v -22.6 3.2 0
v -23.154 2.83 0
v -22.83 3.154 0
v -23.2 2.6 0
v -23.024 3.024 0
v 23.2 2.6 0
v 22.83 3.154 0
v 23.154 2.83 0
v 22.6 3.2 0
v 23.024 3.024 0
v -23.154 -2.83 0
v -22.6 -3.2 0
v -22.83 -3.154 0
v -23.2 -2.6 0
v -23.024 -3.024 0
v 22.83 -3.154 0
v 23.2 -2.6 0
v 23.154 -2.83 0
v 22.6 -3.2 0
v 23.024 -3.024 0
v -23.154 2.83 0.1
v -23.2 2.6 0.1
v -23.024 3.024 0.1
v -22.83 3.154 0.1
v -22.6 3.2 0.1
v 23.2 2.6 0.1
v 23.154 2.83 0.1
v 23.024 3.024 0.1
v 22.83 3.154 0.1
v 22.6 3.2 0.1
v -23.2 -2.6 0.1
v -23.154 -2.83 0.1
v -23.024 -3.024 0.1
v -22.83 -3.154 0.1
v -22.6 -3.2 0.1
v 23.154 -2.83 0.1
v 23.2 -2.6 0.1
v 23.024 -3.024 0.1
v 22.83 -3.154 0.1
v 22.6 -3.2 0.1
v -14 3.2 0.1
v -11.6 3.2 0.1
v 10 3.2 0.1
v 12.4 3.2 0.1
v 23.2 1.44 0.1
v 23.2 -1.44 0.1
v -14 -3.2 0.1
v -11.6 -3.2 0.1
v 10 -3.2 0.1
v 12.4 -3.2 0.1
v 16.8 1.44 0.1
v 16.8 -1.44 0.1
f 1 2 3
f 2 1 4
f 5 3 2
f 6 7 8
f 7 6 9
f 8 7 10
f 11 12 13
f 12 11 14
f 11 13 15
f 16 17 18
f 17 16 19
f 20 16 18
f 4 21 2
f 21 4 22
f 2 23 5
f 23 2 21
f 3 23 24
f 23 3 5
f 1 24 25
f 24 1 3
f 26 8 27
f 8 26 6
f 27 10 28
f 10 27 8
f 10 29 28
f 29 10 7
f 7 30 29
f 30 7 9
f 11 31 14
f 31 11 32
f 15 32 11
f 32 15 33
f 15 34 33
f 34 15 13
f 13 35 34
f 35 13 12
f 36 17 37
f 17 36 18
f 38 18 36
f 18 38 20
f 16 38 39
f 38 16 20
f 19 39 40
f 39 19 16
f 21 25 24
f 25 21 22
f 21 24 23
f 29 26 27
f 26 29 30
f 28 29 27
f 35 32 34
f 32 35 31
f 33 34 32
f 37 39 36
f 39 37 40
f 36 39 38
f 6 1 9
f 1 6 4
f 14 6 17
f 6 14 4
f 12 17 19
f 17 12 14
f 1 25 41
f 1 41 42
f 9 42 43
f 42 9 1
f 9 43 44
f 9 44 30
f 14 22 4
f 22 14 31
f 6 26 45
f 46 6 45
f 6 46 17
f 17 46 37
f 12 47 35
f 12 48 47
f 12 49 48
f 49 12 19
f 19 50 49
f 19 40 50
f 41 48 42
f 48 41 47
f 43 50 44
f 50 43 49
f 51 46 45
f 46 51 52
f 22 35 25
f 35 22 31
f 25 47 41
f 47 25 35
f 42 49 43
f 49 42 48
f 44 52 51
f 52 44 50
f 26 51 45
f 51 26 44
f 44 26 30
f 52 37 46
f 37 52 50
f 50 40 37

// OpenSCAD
// file: ../p/1-4cyli.scad
use <../lib.scad>
function ldraw_lib__1_4cyli() = [
// 0 Cylinder 0.25
// 0 Name: 1-4cyli.dat
// 0 Author: James Jessiman
// 0 !LDRAW_ORG Primitive UPDATE 2012-01
// 0 !LICENSE Licensed under CC BY 4.0 : see CAreadme.txt
// 
// 0 BFC CERTIFY CCW
  [0,"BFC","CERTIFY"],
  [0,"BFC","CCW"],
// 
// 0 !HISTORY 2002-03-23 [sbliss] Added BFC statement.
// 0 !HISTORY 2002-04-25 [PTadmin] Official Update 2002-02
// 0 !HISTORY 2007-06-22 [PTadmin] Header formatted for Contributor Agreement
// 0 !HISTORY 2008-07-01 [PTadmin] Official Update 2008-01
// 0 !HISTORY 2012-02-16 [Philo] Changed to CCW
// 0 !HISTORY 2012-03-30 [PTadmin] Official Update 2012-01
// 
// 
// 4 16 1 1 0 0.9239 1 0.3827 0.9239 0 0.3827 1 0 0
  [4,16,1,1,0,0.9239,1,0.3827,0.9239,0,0.3827,1,0,0],
// 5 24 1 0 0 1 1 0 0.9239 0 0.3827 1 0 -1
  [5,24,1,0,0,1,1,0,0.9239,0,0.3827,1,0,-1],
// 4 16 0.9239 1 0.3827 0.7071 1 0.7071 0.7071 0 0.7071 0.9239 0 0.3827
  [4,16,0.9239,1,0.3827,0.7071,1,0.7071,0.7071,0,0.7071,0.9239,0,0.3827],
// 5 24 0.9239 0 0.3827 0.9239 1 0.3827 0.7071 0 0.7071 1 0 0
  [5,24,0.9239,0,0.3827,0.9239,1,0.3827,0.7071,0,0.7071,1,0,0],
// 4 16 0.7071 1 0.7071 0.3827 1 0.9239 0.3827 0 0.9239 0.7071 0 0.7071
  [4,16,0.7071,1,0.7071,0.3827,1,0.9239,0.3827,0,0.9239,0.7071,0,0.7071],
// 5 24 0.7071 0 0.7071 0.7071 1 0.7071 0.3827 0 0.9239 0.9239 0 0.3827
  [5,24,0.7071,0,0.7071,0.7071,1,0.7071,0.3827,0,0.9239,0.9239,0,0.3827],
// 4 16 0.3827 1 0.9239 0 1 1 0 0 1 0.3827 0 0.9239
  [4,16,0.3827,1,0.9239,0,1,1,0,0,1,0.3827,0,0.9239],
// 5 24 0.3827 0 0.9239 0.3827 1 0.9239 0 0 1 0.7071 0 0.7071
  [5,24,0.3827,0,0.9239,0.3827,1,0.9239,0,0,1,0.7071,0,0.7071],
// 5 24 0 0 1 0 1 1 0.3827 0 0.9239 -1 0 1
  [5,24,0,0,1,0,1,1,0.3827,0,0.9239,-1,0,1],
];
module ldraw_lib__1_4cyli(step=0, col=false, unit=2/5, alt=false, line=0.2, solid=!$preview)
    makepoly(ldraw_lib__1_4cyli(), step=step, col=col, unit=unit, alt=alt, line=line, solid=solid);
ldraw_lib__1_4cyli(line=0.2);
// file: ../p/1-4chrd.scad
use <../lib.scad>
function ldraw_lib__1_4chrd() = [
// 0 Chord 0.25
// 0 Name: 1-4chrd.dat
// 0 Author: Max Martin Richter [MMR1988]
// 0 !LDRAW_ORG Primitive UPDATE 2023-05
// 0 !LICENSE Licensed under CC BY 4.0 : see CAreadme.txt
// 
// 0 BFC CERTIFY CCW
  [0,"BFC","CERTIFY"],
  [0,"BFC","CCW"],
// 
// 0 !HISTORY 2004-04-22 [PTadmin] Official Update 2004-02
// 0 !HISTORY 2007-10-09 [PTadmin] Header formatted for Contributor Agreement
// 0 !HISTORY 2008-07-01 [PTadmin] Official Update 2008-01
// 0 !HISTORY 2012-08-02 [MMR1988] Re-creation with PrimGen2 and Rectifier
// 0 !HISTORY 2012-08-09 [PTadmin] Official Update 2012-02
// 0 !HISTORY 2023-10-27 [OrionP] Change author to MMR1988 from hafhead
// 0 !HISTORY 2023-10-31 [OrionP] Official Update 2023-05
// 
// 4 16 0.9239 0 0.3827 0.3827 0 0.9239 0 0 1 1 0 0
  [4,16,0.9239,0,0.3827,0.3827,0,0.9239,0,0,1,1,0,0],
// 3 16 0.7071 0 0.7071 0.3827 0 0.9239 0.9239 0 0.3827
  [3,16,0.7071,0,0.7071,0.3827,0,0.9239,0.9239,0,0.3827],
];
module ldraw_lib__1_4chrd(step=0, col=false, unit=2/5, alt=false, line=0.2, solid=!$preview)
    makepoly(ldraw_lib__1_4chrd(), step=step, col=col, unit=unit, alt=alt, line=line, solid=solid);
ldraw_lib__1_4chrd(line=0.2);
// main file
use <../lib.scad>
use <../p/1-4chrd.scad>
use <../p/1-4cyli.scad>
function ldraw_lib__6148328at() = [
// 0 Sticker  0.8 x  5.8 with Dark Grey Lines on White Background
// 0 Name: 6148328at.dat
// 0 Author: Massimo Maso [Sirio]
// 0 !LDRAW_ORG Part UPDATE 2024-08
// 0 !LICENSE Licensed under CC BY 4.0 : see CAreadme.txt
// 
// 0 BFC CERTIFY CCW
  [0,"BFC","CERTIFY"],
  [0,"BFC","CCW"],
// 
// 0 !KEYWORDS 919, Bricklink 75876stk01, Brickowl 852010, Hybrid, Pit Lane
// 0 !KEYWORDS Porsche, Rebrickable 26357, set 75876, Speed Champions
// 
// 0 !HISTORY 2024-09-30 [OrionP] Official Update 2024-08
// 
// 
// 0 // Primitives
// 1 16 -56.5 0 6.5 -1.5 0 0 0 -1 0 0 0 1.5 1-4chrd.dat
  [1,16,-56.5,0,6.5,-1.5,0,0,0,-1,0,0,0,1.5, ldraw_lib__1_4chrd()],
// 1 16 56.5 0 6.5 1.5 0 0 0 -1 0 0 0 1.5 1-4chrd.dat
  [1,16,56.5,0,6.5,1.5,0,0,0,-1,0,0,0,1.5, ldraw_lib__1_4chrd()],
// 1 16 -56.5 0 -6.5 -1.5 0 0 0 -1 0 0 0 -1.5 1-4chrd.dat
  [1,16,-56.5,0,-6.5,-1.5,0,0,0,-1,0,0,0,-1.5, ldraw_lib__1_4chrd()],
// 1 16 56.5 0 -6.5 1.5 0 0 0 -1 0 0 0 -1.5 1-4chrd.dat
  [1,16,56.5,0,-6.5,1.5,0,0,0,-1,0,0,0,-1.5, ldraw_lib__1_4chrd()],
// 1 16 -56.5 0 6.5 -1.5 0 0 0 -.25 0 0 0 1.5 1-4cyli.dat
  [1,16,-56.5,0,6.5,-1.5,0,0,0,-.25,0,0,0,1.5, ldraw_lib__1_4cyli()],
// 1 16 56.5 0 6.5 1.5 0 0 0 -.25 0 0 0 1.5 1-4cyli.dat
  [1,16,56.5,0,6.5,1.5,0,0,0,-.25,0,0,0,1.5, ldraw_lib__1_4cyli()],
// 1 16 -56.5 0 -6.5 -1.5 0 0 0 -.25 0 0 0 -1.5 1-4cyli.dat
  [1,16,-56.5,0,-6.5,-1.5,0,0,0,-.25,0,0,0,-1.5, ldraw_lib__1_4cyli()],
// 1 16 56.5 0 -6.5 1.5 0 0 0 -.25 0 0 0 -1.5 1-4cyli.dat
  [1,16,56.5,0,-6.5,1.5,0,0,0,-.25,0,0,0,-1.5, ldraw_lib__1_4cyli()],
// 1 15 -56.5 -.25 6.5 -1.5 0 0 0 1 0 0 0 1.5 1-4chrd.dat
  [1,15,-56.5,-.25,6.5,-1.5,0,0,0,1,0,0,0,1.5, ldraw_lib__1_4chrd()],
// 1 15 56.5 -.25 6.5 1.5 0 0 0 1 0 0 0 1.5 1-4chrd.dat
  [1,15,56.5,-.25,6.5,1.5,0,0,0,1,0,0,0,1.5, ldraw_lib__1_4chrd()],
// 1 15 -56.5 -.25 -6.5 -1.5 0 0 0 1 0 0 0 -1.5 1-4chrd.dat
  [1,15,-56.5,-.25,-6.5,-1.5,0,0,0,1,0,0,0,-1.5, ldraw_lib__1_4chrd()],
// 1 15 56.5 -.25 -6.5 1.5 0 0 0 1 0 0 0 -1.5 1-4chrd.dat
  [1,15,56.5,-.25,-6.5,1.5,0,0,0,1,0,0,0,-1.5, ldraw_lib__1_4chrd()],
// 0 // Bottom faces
// 4 16 56.5 0 8 58 0 6.5 -58 0 6.5 -56.5 0 8
  [4,16,56.5,0,8,58,0,6.5,-58,0,6.5,-56.5,0,8],
// 4 16 58 0 6.5 58 0 -6.5 -58 0 -6.5 -58 0 6.5
  [4,16,58,0,6.5,58,0,-6.5,-58,0,-6.5,-58,0,6.5],
// 4 16 56.5 0 -8 -56.5 0 -8 -58 0 -6.5 58 0 -6.5
  [4,16,56.5,0,-8,-56.5,0,-8,-58,0,-6.5,58,0,-6.5],
// 0 // Lateral faces
// 3 16 -56.5 0 8 -56.5 -.25 8 -35 -.25 8
  [3,16,-56.5,0,8,-56.5,-.25,8,-35,-.25,8],
// 3 16 -56.5 0 8 -35 -.25 8 -29 -.25 8
  [3,16,-56.5,0,8,-35,-.25,8,-29,-.25,8],
// 4 16 -56.5 0 8 -29 -.25 8 25 -.25 8 56.5 0 8
  [4,16,-56.5,0,8,-29,-.25,8,25,-.25,8,56.5,0,8],
// 3 16 56.5 0 8 25 -.25 8 31 -.25 8
  [3,16,56.5,0,8,25,-.25,8,31,-.25,8],
// 3 16 56.5 0 8 31 -.25 8 56.5 -.25 8
  [3,16,56.5,0,8,31,-.25,8,56.5,-.25,8],
// 4 16 -58 0 6.5 -58 0 -6.5 -58 -.25 -6.5 -58 -.25 6.5
  [4,16,-58,0,6.5,-58,0,-6.5,-58,-.25,-6.5,-58,-.25,6.5],
// 3 16 58 0 6.5 58 -.25 6.5 58 -.25 3.6
  [3,16,58,0,6.5,58,-.25,6.5,58,-.25,3.6],
// 4 16 58 0 6.5 58 -.25 3.6 58 -.25 -3.6 58 0 -6.5
  [4,16,58,0,6.5,58,-.25,3.6,58,-.25,-3.6,58,0,-6.5],
// 3 16 58 0 -6.5 58 -.25 -3.6 58 -.25 -6.5
  [3,16,58,0,-6.5,58,-.25,-3.6,58,-.25,-6.5],
// 3 16 -56.5 0 -8 -35 -.25 -8 -56.5 -.25 -8
  [3,16,-56.5,0,-8,-35,-.25,-8,-56.5,-.25,-8],
// 3 16 -56.5 0 -8 -29 -.25 -8 -35 -.25 -8
  [3,16,-56.5,0,-8,-29,-.25,-8,-35,-.25,-8],
// 4 16 -56.5 0 -8 56.5 0 -8 25 -.25 -8 -29 -.25 -8
  [4,16,-56.5,0,-8,56.5,0,-8,25,-.25,-8,-29,-.25,-8],
// 3 16 56.5 0 -8 31 -.25 -8 25 -.25 -8
  [3,16,56.5,0,-8,31,-.25,-8,25,-.25,-8],
// 3 16 56.5 0 -8 56.5 -.25 -8 31 -.25 -8
  [3,16,56.5,0,-8,56.5,-.25,-8,31,-.25,-8],
// 0 // Top faces
// 0 // Dark grey faces
// 4 72 -29 -.25 8 -35 -.25 8 -35 -.25 -8 -29 -.25 -8
  [4,72,-29,-.25,8,-35,-.25,8,-35,-.25,-8,-29,-.25,-8],
// 4 72 31 -.25 8 25 -.25 8 25 -.25 -8 31 -.25 -8
  [4,72,31,-.25,8,25,-.25,8,25,-.25,-8,31,-.25,-8],
// 4 72 58 -.25 3.6 42 -.25 3.6 42 -.25 -3.6 58 -.25 -3.6
  [4,72,58,-.25,3.6,42,-.25,3.6,42,-.25,-3.6,58,-.25,-3.6],
// 0 // White faces
// 4 15 -56.5 -.25 8 -58 -.25 6.5 -58 -.25 -6.5 -56.5 -.25 -8
  [4,15,-56.5,-.25,8,-58,-.25,6.5,-58,-.25,-6.5,-56.5,-.25,-8],
// 4 15 -56.5 -.25 8 -56.5 -.25 -8 -35 -.25 -8 -35 -.25 8
  [4,15,-56.5,-.25,8,-56.5,-.25,-8,-35,-.25,-8,-35,-.25,8],
// 4 15 -29 -.25 8 -29 -.25 -8 25 -.25 -8 25 -.25 8
  [4,15,-29,-.25,8,-29,-.25,-8,25,-.25,-8,25,-.25,8],
// 4 15 31 -.25 8 31 -.25 -8 42 -.25 -3.6 42 -.25 3.6
  [4,15,31,-.25,8,31,-.25,-8,42,-.25,-3.6,42,-.25,3.6],
// 4 15 31 -.25 8 42 -.25 3.6 58 -.25 3.6 58 -.25 6.5
  [4,15,31,-.25,8,42,-.25,3.6,58,-.25,3.6,58,-.25,6.5],
// 3 15 31 -.25 8 58 -.25 6.5 56.5 -.25 8
  [3,15,31,-.25,8,58,-.25,6.5,56.5,-.25,8],
// 4 15 31 -.25 -8 58 -.25 -6.5 58 -.25 -3.6 42 -.25 -3.6
  [4,15,31,-.25,-8,58,-.25,-6.5,58,-.25,-3.6,42,-.25,-3.6],
// 3 15 31 -.25 -8 56.5 -.25 -8 58 -.25 -6.5
  [3,15,31,-.25,-8,56.5,-.25,-8,58,-.25,-6.5],
];
module ldraw_lib__6148328at(step=0, col=false, unit=2/5, alt=false, line=0.2, solid=!$preview)
    makepoly(ldraw_lib__6148328at(), step=step, col=col, unit=unit, alt=alt, line=line, solid=solid);
ldraw_lib__6148328at(line=0.2);
